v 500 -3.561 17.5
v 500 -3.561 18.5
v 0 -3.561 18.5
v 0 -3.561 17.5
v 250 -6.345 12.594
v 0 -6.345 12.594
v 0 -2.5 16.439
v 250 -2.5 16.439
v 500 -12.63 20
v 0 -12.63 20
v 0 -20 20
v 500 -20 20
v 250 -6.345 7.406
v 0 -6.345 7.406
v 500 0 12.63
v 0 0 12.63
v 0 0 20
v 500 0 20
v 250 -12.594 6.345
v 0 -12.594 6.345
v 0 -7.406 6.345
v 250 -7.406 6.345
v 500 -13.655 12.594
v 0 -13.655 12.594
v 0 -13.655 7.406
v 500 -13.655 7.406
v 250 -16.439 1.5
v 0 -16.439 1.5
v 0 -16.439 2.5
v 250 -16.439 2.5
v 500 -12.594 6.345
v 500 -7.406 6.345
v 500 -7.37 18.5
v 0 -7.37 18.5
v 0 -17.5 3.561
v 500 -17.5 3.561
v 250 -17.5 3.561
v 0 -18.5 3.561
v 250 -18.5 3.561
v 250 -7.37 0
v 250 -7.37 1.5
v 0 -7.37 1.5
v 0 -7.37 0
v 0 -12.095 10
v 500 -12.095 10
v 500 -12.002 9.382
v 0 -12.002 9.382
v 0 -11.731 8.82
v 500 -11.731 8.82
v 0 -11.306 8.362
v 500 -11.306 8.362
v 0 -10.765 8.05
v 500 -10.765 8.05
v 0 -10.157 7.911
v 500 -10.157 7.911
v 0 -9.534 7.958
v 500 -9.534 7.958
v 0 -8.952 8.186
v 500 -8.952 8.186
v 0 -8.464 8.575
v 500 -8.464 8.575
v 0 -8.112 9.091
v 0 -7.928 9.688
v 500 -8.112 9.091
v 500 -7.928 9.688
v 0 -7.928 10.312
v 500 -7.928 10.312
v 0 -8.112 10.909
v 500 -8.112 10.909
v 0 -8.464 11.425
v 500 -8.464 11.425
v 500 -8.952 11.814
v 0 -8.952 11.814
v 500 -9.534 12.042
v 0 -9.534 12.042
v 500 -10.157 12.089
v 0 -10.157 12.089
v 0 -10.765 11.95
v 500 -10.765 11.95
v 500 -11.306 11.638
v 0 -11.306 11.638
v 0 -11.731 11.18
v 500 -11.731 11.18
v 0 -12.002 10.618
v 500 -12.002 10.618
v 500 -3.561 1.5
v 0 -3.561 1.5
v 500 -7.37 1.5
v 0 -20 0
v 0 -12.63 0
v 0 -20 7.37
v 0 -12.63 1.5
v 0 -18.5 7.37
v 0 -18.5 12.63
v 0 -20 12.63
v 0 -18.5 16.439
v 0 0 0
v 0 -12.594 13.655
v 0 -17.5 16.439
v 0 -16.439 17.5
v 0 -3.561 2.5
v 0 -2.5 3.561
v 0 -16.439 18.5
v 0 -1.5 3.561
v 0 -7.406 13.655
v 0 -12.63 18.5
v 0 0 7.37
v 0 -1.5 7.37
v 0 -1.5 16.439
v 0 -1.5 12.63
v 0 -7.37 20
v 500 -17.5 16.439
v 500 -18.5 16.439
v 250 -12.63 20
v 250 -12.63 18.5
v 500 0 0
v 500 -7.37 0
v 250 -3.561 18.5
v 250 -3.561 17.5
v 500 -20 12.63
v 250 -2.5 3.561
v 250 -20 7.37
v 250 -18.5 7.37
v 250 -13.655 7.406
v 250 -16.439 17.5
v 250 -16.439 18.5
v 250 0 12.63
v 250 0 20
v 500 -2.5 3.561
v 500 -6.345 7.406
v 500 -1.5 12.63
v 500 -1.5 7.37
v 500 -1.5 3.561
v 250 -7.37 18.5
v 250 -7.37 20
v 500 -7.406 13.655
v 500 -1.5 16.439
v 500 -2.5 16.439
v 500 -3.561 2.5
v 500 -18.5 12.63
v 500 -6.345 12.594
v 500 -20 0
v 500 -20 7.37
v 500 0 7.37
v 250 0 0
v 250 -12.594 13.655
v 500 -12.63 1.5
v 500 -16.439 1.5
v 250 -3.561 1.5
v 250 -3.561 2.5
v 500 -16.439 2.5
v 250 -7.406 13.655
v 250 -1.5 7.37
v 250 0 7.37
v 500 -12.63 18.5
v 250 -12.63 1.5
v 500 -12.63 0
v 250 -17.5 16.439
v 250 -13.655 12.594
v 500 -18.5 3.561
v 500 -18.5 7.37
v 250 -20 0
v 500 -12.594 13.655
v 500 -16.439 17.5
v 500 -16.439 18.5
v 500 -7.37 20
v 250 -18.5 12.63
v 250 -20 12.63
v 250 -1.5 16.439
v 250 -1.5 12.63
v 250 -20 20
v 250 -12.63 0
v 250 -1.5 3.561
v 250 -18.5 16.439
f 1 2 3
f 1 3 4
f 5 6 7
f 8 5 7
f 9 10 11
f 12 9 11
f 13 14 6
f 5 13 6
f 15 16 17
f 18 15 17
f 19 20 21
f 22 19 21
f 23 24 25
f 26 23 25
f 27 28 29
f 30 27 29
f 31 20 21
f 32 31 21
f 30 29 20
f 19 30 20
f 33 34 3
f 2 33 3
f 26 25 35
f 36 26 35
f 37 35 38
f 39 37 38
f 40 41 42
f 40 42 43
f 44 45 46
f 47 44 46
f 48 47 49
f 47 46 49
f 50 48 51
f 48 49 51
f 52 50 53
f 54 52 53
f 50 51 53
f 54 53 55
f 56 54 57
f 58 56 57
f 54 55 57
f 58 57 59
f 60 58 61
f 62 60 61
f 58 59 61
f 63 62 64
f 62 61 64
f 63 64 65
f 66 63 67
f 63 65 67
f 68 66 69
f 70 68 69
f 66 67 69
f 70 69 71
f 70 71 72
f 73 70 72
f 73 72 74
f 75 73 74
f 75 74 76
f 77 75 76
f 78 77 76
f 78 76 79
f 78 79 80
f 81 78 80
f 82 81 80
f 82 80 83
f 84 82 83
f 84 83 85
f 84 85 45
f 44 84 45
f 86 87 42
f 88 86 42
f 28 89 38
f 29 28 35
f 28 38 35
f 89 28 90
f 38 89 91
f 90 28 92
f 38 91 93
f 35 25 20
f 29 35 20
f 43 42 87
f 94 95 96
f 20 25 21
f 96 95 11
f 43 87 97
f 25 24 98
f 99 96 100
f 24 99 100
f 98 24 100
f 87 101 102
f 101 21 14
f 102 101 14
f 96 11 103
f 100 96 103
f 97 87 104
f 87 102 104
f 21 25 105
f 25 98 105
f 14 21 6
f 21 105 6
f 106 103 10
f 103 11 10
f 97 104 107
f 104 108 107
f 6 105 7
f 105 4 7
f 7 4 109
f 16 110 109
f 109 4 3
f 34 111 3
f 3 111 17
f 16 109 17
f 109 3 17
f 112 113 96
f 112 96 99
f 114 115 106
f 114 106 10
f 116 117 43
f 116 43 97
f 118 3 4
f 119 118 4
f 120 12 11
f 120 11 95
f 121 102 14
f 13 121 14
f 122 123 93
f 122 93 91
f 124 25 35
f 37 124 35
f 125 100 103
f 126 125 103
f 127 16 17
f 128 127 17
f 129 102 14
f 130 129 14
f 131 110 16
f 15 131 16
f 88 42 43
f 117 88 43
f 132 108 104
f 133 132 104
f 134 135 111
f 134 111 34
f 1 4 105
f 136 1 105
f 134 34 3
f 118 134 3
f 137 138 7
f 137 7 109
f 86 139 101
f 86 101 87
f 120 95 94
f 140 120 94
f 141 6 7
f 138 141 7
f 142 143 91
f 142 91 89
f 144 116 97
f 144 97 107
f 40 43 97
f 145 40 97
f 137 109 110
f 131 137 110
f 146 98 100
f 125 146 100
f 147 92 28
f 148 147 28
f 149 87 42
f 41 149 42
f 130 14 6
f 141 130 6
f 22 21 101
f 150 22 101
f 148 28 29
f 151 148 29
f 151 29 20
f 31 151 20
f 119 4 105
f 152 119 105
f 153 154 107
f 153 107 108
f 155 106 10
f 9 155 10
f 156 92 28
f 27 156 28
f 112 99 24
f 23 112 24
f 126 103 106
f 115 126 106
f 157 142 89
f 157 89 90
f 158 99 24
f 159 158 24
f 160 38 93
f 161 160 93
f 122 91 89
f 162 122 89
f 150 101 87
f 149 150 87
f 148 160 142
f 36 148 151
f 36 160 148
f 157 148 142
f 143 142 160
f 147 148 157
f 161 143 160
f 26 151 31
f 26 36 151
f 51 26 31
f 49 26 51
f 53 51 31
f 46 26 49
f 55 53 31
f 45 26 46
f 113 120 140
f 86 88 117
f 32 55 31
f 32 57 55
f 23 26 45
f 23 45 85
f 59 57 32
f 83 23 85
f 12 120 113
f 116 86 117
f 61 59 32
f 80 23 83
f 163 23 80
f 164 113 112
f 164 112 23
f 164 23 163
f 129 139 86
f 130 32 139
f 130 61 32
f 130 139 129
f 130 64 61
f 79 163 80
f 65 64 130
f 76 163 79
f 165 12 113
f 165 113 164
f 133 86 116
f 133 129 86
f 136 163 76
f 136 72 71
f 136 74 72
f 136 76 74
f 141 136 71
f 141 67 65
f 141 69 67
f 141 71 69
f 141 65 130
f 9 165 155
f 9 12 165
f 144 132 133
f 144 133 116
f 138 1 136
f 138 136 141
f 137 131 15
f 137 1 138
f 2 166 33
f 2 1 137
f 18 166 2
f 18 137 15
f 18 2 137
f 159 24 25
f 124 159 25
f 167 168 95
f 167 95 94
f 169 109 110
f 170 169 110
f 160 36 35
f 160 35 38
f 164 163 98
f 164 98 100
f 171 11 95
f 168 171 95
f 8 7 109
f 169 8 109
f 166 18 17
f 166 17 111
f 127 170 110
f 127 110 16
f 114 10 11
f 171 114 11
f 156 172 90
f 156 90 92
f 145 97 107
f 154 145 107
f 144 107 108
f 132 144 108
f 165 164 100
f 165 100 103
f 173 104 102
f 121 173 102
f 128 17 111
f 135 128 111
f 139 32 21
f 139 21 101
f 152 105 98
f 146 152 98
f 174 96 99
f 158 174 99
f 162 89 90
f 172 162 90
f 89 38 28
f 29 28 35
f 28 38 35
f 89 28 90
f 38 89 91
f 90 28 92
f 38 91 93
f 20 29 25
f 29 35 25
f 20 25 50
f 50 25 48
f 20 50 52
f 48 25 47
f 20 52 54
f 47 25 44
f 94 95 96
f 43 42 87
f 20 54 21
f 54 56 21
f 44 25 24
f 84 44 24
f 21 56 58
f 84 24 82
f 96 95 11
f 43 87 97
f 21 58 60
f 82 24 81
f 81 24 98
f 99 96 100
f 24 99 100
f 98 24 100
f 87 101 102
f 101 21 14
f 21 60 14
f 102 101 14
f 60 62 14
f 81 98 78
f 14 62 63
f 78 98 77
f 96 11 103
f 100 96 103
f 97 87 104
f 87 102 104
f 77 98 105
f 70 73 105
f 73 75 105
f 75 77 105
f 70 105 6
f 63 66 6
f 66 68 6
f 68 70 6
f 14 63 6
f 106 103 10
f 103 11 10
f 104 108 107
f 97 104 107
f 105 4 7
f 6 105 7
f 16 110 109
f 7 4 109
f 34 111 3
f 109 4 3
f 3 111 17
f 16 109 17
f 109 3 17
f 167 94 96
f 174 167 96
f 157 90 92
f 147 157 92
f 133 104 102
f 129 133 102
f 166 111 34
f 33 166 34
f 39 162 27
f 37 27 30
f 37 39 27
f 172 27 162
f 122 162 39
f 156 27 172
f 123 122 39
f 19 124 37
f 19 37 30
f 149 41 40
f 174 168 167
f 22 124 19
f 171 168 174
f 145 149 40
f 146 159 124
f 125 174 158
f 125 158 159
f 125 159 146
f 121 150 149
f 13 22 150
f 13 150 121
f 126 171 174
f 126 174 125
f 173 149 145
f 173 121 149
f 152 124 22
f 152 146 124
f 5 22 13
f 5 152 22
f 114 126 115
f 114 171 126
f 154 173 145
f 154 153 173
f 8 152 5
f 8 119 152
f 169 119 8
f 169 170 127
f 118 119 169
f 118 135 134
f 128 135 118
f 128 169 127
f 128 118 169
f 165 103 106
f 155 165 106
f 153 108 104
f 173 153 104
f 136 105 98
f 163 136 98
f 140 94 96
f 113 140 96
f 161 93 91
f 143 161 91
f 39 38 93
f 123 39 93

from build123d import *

# Parameters (mm, degrees)
F1_DEPTH = 500
F2_D     = 4.19
F3_DEPTH = 250


with BuildPart() as f1:
    # F0 (on Right) → F1 (new body)
    with BuildSketch(Plane.YZ):
        Polygon((-12.63, 20), (-20, 20), (-20, 12.63), (-18.5, 12.63), (-18.5, 16.4394841107), (-17.5001442825, 16.4394841107), (-13.655, 12.5943398282), (-13.655, 7.4056601718), (-17.5001442825, 3.5605158893), (-18.5, 3.5605158893), (-18.5, 7.37), (-20, 7.37), (-20, 0), (-12.63, 0), (-12.63, 1.5), (-16.4394841107, 1.5), (-16.4394841107, 2.4998557175), (-12.5943398282, 6.345), (-7.4056601718, 6.345), (-3.5605158893, 2.4998557175), (-3.5605158893, 1.5), (-7.37, 1.5), (-7.37, 0), (0, 0), (0, 7.37), (-1.5, 7.37), (-1.5, 3.5605158893), (-2.4998557175, 3.5605158893), (-6.345, 7.4056601718), (-6.345, 12.5943398282), (-2.4998557175, 16.4394841107), (-1.5, 16.4394841107), (-1.5, 12.63), (0, 12.63), (0, 20), (-7.37, 20), (-7.37, 18.5), (-3.5605158893, 18.5), (-3.5605158893, 17.5001442825), (-7.4056601718, 13.655), (-12.5943398282, 13.655), (-16.4394841107, 17.5001442825), (-16.4394841107, 18.5), (-12.63, 18.5), align=None)
    extrude(amount=F1_DEPTH)

    # F2 (through all)
    with Locations(Plane(origin=(0, 0, 0), x_dir=(0, 1, 0), z_dir=(-1, 0, 0))):
        with Locations((-10, -10)):
            Hole(F2_D / 2)


with BuildPart() as f3:
    # F0 (on Right) → F3 (new body)
    with BuildSketch(Plane.YZ):
        Polygon((-12.63, 20), (-20, 20), (-20, 12.63), (-18.5, 12.63), (-18.5, 16.4394841107), (-17.5001442825, 16.4394841107), (-13.655, 12.5943398282), (-13.655, 7.4056601718), (-17.5001442825, 3.5605158893), (-18.5, 3.5605158893), (-18.5, 7.37), (-20, 7.37), (-20, 0), (-12.63, 0), (-12.63, 1.5), (-16.4394841107, 1.5), (-16.4394841107, 2.4998557175), (-12.5943398282, 6.345), (-7.4056601718, 6.345), (-3.5605158893, 2.4998557175), (-3.5605158893, 1.5), (-7.37, 1.5), (-7.37, 0), (0, 0), (0, 7.37), (-1.5, 7.37), (-1.5, 3.5605158893), (-2.4998557175, 3.5605158893), (-6.345, 7.4056601718), (-6.345, 12.5943398282), (-2.4998557175, 16.4394841107), (-1.5, 16.4394841107), (-1.5, 12.63), (0, 12.63), (0, 20), (-7.37, 20), (-7.37, 18.5), (-3.5605158893, 18.5), (-3.5605158893, 17.5001442825), (-7.4056601718, 13.655), (-12.5943398282, 13.655), (-16.4394841107, 17.5001442825), (-16.4394841107, 18.5), (-12.63, 18.5), align=None)
    extrude(amount=F3_DEPTH)


solid = Compound([f1.part, f3.part])
